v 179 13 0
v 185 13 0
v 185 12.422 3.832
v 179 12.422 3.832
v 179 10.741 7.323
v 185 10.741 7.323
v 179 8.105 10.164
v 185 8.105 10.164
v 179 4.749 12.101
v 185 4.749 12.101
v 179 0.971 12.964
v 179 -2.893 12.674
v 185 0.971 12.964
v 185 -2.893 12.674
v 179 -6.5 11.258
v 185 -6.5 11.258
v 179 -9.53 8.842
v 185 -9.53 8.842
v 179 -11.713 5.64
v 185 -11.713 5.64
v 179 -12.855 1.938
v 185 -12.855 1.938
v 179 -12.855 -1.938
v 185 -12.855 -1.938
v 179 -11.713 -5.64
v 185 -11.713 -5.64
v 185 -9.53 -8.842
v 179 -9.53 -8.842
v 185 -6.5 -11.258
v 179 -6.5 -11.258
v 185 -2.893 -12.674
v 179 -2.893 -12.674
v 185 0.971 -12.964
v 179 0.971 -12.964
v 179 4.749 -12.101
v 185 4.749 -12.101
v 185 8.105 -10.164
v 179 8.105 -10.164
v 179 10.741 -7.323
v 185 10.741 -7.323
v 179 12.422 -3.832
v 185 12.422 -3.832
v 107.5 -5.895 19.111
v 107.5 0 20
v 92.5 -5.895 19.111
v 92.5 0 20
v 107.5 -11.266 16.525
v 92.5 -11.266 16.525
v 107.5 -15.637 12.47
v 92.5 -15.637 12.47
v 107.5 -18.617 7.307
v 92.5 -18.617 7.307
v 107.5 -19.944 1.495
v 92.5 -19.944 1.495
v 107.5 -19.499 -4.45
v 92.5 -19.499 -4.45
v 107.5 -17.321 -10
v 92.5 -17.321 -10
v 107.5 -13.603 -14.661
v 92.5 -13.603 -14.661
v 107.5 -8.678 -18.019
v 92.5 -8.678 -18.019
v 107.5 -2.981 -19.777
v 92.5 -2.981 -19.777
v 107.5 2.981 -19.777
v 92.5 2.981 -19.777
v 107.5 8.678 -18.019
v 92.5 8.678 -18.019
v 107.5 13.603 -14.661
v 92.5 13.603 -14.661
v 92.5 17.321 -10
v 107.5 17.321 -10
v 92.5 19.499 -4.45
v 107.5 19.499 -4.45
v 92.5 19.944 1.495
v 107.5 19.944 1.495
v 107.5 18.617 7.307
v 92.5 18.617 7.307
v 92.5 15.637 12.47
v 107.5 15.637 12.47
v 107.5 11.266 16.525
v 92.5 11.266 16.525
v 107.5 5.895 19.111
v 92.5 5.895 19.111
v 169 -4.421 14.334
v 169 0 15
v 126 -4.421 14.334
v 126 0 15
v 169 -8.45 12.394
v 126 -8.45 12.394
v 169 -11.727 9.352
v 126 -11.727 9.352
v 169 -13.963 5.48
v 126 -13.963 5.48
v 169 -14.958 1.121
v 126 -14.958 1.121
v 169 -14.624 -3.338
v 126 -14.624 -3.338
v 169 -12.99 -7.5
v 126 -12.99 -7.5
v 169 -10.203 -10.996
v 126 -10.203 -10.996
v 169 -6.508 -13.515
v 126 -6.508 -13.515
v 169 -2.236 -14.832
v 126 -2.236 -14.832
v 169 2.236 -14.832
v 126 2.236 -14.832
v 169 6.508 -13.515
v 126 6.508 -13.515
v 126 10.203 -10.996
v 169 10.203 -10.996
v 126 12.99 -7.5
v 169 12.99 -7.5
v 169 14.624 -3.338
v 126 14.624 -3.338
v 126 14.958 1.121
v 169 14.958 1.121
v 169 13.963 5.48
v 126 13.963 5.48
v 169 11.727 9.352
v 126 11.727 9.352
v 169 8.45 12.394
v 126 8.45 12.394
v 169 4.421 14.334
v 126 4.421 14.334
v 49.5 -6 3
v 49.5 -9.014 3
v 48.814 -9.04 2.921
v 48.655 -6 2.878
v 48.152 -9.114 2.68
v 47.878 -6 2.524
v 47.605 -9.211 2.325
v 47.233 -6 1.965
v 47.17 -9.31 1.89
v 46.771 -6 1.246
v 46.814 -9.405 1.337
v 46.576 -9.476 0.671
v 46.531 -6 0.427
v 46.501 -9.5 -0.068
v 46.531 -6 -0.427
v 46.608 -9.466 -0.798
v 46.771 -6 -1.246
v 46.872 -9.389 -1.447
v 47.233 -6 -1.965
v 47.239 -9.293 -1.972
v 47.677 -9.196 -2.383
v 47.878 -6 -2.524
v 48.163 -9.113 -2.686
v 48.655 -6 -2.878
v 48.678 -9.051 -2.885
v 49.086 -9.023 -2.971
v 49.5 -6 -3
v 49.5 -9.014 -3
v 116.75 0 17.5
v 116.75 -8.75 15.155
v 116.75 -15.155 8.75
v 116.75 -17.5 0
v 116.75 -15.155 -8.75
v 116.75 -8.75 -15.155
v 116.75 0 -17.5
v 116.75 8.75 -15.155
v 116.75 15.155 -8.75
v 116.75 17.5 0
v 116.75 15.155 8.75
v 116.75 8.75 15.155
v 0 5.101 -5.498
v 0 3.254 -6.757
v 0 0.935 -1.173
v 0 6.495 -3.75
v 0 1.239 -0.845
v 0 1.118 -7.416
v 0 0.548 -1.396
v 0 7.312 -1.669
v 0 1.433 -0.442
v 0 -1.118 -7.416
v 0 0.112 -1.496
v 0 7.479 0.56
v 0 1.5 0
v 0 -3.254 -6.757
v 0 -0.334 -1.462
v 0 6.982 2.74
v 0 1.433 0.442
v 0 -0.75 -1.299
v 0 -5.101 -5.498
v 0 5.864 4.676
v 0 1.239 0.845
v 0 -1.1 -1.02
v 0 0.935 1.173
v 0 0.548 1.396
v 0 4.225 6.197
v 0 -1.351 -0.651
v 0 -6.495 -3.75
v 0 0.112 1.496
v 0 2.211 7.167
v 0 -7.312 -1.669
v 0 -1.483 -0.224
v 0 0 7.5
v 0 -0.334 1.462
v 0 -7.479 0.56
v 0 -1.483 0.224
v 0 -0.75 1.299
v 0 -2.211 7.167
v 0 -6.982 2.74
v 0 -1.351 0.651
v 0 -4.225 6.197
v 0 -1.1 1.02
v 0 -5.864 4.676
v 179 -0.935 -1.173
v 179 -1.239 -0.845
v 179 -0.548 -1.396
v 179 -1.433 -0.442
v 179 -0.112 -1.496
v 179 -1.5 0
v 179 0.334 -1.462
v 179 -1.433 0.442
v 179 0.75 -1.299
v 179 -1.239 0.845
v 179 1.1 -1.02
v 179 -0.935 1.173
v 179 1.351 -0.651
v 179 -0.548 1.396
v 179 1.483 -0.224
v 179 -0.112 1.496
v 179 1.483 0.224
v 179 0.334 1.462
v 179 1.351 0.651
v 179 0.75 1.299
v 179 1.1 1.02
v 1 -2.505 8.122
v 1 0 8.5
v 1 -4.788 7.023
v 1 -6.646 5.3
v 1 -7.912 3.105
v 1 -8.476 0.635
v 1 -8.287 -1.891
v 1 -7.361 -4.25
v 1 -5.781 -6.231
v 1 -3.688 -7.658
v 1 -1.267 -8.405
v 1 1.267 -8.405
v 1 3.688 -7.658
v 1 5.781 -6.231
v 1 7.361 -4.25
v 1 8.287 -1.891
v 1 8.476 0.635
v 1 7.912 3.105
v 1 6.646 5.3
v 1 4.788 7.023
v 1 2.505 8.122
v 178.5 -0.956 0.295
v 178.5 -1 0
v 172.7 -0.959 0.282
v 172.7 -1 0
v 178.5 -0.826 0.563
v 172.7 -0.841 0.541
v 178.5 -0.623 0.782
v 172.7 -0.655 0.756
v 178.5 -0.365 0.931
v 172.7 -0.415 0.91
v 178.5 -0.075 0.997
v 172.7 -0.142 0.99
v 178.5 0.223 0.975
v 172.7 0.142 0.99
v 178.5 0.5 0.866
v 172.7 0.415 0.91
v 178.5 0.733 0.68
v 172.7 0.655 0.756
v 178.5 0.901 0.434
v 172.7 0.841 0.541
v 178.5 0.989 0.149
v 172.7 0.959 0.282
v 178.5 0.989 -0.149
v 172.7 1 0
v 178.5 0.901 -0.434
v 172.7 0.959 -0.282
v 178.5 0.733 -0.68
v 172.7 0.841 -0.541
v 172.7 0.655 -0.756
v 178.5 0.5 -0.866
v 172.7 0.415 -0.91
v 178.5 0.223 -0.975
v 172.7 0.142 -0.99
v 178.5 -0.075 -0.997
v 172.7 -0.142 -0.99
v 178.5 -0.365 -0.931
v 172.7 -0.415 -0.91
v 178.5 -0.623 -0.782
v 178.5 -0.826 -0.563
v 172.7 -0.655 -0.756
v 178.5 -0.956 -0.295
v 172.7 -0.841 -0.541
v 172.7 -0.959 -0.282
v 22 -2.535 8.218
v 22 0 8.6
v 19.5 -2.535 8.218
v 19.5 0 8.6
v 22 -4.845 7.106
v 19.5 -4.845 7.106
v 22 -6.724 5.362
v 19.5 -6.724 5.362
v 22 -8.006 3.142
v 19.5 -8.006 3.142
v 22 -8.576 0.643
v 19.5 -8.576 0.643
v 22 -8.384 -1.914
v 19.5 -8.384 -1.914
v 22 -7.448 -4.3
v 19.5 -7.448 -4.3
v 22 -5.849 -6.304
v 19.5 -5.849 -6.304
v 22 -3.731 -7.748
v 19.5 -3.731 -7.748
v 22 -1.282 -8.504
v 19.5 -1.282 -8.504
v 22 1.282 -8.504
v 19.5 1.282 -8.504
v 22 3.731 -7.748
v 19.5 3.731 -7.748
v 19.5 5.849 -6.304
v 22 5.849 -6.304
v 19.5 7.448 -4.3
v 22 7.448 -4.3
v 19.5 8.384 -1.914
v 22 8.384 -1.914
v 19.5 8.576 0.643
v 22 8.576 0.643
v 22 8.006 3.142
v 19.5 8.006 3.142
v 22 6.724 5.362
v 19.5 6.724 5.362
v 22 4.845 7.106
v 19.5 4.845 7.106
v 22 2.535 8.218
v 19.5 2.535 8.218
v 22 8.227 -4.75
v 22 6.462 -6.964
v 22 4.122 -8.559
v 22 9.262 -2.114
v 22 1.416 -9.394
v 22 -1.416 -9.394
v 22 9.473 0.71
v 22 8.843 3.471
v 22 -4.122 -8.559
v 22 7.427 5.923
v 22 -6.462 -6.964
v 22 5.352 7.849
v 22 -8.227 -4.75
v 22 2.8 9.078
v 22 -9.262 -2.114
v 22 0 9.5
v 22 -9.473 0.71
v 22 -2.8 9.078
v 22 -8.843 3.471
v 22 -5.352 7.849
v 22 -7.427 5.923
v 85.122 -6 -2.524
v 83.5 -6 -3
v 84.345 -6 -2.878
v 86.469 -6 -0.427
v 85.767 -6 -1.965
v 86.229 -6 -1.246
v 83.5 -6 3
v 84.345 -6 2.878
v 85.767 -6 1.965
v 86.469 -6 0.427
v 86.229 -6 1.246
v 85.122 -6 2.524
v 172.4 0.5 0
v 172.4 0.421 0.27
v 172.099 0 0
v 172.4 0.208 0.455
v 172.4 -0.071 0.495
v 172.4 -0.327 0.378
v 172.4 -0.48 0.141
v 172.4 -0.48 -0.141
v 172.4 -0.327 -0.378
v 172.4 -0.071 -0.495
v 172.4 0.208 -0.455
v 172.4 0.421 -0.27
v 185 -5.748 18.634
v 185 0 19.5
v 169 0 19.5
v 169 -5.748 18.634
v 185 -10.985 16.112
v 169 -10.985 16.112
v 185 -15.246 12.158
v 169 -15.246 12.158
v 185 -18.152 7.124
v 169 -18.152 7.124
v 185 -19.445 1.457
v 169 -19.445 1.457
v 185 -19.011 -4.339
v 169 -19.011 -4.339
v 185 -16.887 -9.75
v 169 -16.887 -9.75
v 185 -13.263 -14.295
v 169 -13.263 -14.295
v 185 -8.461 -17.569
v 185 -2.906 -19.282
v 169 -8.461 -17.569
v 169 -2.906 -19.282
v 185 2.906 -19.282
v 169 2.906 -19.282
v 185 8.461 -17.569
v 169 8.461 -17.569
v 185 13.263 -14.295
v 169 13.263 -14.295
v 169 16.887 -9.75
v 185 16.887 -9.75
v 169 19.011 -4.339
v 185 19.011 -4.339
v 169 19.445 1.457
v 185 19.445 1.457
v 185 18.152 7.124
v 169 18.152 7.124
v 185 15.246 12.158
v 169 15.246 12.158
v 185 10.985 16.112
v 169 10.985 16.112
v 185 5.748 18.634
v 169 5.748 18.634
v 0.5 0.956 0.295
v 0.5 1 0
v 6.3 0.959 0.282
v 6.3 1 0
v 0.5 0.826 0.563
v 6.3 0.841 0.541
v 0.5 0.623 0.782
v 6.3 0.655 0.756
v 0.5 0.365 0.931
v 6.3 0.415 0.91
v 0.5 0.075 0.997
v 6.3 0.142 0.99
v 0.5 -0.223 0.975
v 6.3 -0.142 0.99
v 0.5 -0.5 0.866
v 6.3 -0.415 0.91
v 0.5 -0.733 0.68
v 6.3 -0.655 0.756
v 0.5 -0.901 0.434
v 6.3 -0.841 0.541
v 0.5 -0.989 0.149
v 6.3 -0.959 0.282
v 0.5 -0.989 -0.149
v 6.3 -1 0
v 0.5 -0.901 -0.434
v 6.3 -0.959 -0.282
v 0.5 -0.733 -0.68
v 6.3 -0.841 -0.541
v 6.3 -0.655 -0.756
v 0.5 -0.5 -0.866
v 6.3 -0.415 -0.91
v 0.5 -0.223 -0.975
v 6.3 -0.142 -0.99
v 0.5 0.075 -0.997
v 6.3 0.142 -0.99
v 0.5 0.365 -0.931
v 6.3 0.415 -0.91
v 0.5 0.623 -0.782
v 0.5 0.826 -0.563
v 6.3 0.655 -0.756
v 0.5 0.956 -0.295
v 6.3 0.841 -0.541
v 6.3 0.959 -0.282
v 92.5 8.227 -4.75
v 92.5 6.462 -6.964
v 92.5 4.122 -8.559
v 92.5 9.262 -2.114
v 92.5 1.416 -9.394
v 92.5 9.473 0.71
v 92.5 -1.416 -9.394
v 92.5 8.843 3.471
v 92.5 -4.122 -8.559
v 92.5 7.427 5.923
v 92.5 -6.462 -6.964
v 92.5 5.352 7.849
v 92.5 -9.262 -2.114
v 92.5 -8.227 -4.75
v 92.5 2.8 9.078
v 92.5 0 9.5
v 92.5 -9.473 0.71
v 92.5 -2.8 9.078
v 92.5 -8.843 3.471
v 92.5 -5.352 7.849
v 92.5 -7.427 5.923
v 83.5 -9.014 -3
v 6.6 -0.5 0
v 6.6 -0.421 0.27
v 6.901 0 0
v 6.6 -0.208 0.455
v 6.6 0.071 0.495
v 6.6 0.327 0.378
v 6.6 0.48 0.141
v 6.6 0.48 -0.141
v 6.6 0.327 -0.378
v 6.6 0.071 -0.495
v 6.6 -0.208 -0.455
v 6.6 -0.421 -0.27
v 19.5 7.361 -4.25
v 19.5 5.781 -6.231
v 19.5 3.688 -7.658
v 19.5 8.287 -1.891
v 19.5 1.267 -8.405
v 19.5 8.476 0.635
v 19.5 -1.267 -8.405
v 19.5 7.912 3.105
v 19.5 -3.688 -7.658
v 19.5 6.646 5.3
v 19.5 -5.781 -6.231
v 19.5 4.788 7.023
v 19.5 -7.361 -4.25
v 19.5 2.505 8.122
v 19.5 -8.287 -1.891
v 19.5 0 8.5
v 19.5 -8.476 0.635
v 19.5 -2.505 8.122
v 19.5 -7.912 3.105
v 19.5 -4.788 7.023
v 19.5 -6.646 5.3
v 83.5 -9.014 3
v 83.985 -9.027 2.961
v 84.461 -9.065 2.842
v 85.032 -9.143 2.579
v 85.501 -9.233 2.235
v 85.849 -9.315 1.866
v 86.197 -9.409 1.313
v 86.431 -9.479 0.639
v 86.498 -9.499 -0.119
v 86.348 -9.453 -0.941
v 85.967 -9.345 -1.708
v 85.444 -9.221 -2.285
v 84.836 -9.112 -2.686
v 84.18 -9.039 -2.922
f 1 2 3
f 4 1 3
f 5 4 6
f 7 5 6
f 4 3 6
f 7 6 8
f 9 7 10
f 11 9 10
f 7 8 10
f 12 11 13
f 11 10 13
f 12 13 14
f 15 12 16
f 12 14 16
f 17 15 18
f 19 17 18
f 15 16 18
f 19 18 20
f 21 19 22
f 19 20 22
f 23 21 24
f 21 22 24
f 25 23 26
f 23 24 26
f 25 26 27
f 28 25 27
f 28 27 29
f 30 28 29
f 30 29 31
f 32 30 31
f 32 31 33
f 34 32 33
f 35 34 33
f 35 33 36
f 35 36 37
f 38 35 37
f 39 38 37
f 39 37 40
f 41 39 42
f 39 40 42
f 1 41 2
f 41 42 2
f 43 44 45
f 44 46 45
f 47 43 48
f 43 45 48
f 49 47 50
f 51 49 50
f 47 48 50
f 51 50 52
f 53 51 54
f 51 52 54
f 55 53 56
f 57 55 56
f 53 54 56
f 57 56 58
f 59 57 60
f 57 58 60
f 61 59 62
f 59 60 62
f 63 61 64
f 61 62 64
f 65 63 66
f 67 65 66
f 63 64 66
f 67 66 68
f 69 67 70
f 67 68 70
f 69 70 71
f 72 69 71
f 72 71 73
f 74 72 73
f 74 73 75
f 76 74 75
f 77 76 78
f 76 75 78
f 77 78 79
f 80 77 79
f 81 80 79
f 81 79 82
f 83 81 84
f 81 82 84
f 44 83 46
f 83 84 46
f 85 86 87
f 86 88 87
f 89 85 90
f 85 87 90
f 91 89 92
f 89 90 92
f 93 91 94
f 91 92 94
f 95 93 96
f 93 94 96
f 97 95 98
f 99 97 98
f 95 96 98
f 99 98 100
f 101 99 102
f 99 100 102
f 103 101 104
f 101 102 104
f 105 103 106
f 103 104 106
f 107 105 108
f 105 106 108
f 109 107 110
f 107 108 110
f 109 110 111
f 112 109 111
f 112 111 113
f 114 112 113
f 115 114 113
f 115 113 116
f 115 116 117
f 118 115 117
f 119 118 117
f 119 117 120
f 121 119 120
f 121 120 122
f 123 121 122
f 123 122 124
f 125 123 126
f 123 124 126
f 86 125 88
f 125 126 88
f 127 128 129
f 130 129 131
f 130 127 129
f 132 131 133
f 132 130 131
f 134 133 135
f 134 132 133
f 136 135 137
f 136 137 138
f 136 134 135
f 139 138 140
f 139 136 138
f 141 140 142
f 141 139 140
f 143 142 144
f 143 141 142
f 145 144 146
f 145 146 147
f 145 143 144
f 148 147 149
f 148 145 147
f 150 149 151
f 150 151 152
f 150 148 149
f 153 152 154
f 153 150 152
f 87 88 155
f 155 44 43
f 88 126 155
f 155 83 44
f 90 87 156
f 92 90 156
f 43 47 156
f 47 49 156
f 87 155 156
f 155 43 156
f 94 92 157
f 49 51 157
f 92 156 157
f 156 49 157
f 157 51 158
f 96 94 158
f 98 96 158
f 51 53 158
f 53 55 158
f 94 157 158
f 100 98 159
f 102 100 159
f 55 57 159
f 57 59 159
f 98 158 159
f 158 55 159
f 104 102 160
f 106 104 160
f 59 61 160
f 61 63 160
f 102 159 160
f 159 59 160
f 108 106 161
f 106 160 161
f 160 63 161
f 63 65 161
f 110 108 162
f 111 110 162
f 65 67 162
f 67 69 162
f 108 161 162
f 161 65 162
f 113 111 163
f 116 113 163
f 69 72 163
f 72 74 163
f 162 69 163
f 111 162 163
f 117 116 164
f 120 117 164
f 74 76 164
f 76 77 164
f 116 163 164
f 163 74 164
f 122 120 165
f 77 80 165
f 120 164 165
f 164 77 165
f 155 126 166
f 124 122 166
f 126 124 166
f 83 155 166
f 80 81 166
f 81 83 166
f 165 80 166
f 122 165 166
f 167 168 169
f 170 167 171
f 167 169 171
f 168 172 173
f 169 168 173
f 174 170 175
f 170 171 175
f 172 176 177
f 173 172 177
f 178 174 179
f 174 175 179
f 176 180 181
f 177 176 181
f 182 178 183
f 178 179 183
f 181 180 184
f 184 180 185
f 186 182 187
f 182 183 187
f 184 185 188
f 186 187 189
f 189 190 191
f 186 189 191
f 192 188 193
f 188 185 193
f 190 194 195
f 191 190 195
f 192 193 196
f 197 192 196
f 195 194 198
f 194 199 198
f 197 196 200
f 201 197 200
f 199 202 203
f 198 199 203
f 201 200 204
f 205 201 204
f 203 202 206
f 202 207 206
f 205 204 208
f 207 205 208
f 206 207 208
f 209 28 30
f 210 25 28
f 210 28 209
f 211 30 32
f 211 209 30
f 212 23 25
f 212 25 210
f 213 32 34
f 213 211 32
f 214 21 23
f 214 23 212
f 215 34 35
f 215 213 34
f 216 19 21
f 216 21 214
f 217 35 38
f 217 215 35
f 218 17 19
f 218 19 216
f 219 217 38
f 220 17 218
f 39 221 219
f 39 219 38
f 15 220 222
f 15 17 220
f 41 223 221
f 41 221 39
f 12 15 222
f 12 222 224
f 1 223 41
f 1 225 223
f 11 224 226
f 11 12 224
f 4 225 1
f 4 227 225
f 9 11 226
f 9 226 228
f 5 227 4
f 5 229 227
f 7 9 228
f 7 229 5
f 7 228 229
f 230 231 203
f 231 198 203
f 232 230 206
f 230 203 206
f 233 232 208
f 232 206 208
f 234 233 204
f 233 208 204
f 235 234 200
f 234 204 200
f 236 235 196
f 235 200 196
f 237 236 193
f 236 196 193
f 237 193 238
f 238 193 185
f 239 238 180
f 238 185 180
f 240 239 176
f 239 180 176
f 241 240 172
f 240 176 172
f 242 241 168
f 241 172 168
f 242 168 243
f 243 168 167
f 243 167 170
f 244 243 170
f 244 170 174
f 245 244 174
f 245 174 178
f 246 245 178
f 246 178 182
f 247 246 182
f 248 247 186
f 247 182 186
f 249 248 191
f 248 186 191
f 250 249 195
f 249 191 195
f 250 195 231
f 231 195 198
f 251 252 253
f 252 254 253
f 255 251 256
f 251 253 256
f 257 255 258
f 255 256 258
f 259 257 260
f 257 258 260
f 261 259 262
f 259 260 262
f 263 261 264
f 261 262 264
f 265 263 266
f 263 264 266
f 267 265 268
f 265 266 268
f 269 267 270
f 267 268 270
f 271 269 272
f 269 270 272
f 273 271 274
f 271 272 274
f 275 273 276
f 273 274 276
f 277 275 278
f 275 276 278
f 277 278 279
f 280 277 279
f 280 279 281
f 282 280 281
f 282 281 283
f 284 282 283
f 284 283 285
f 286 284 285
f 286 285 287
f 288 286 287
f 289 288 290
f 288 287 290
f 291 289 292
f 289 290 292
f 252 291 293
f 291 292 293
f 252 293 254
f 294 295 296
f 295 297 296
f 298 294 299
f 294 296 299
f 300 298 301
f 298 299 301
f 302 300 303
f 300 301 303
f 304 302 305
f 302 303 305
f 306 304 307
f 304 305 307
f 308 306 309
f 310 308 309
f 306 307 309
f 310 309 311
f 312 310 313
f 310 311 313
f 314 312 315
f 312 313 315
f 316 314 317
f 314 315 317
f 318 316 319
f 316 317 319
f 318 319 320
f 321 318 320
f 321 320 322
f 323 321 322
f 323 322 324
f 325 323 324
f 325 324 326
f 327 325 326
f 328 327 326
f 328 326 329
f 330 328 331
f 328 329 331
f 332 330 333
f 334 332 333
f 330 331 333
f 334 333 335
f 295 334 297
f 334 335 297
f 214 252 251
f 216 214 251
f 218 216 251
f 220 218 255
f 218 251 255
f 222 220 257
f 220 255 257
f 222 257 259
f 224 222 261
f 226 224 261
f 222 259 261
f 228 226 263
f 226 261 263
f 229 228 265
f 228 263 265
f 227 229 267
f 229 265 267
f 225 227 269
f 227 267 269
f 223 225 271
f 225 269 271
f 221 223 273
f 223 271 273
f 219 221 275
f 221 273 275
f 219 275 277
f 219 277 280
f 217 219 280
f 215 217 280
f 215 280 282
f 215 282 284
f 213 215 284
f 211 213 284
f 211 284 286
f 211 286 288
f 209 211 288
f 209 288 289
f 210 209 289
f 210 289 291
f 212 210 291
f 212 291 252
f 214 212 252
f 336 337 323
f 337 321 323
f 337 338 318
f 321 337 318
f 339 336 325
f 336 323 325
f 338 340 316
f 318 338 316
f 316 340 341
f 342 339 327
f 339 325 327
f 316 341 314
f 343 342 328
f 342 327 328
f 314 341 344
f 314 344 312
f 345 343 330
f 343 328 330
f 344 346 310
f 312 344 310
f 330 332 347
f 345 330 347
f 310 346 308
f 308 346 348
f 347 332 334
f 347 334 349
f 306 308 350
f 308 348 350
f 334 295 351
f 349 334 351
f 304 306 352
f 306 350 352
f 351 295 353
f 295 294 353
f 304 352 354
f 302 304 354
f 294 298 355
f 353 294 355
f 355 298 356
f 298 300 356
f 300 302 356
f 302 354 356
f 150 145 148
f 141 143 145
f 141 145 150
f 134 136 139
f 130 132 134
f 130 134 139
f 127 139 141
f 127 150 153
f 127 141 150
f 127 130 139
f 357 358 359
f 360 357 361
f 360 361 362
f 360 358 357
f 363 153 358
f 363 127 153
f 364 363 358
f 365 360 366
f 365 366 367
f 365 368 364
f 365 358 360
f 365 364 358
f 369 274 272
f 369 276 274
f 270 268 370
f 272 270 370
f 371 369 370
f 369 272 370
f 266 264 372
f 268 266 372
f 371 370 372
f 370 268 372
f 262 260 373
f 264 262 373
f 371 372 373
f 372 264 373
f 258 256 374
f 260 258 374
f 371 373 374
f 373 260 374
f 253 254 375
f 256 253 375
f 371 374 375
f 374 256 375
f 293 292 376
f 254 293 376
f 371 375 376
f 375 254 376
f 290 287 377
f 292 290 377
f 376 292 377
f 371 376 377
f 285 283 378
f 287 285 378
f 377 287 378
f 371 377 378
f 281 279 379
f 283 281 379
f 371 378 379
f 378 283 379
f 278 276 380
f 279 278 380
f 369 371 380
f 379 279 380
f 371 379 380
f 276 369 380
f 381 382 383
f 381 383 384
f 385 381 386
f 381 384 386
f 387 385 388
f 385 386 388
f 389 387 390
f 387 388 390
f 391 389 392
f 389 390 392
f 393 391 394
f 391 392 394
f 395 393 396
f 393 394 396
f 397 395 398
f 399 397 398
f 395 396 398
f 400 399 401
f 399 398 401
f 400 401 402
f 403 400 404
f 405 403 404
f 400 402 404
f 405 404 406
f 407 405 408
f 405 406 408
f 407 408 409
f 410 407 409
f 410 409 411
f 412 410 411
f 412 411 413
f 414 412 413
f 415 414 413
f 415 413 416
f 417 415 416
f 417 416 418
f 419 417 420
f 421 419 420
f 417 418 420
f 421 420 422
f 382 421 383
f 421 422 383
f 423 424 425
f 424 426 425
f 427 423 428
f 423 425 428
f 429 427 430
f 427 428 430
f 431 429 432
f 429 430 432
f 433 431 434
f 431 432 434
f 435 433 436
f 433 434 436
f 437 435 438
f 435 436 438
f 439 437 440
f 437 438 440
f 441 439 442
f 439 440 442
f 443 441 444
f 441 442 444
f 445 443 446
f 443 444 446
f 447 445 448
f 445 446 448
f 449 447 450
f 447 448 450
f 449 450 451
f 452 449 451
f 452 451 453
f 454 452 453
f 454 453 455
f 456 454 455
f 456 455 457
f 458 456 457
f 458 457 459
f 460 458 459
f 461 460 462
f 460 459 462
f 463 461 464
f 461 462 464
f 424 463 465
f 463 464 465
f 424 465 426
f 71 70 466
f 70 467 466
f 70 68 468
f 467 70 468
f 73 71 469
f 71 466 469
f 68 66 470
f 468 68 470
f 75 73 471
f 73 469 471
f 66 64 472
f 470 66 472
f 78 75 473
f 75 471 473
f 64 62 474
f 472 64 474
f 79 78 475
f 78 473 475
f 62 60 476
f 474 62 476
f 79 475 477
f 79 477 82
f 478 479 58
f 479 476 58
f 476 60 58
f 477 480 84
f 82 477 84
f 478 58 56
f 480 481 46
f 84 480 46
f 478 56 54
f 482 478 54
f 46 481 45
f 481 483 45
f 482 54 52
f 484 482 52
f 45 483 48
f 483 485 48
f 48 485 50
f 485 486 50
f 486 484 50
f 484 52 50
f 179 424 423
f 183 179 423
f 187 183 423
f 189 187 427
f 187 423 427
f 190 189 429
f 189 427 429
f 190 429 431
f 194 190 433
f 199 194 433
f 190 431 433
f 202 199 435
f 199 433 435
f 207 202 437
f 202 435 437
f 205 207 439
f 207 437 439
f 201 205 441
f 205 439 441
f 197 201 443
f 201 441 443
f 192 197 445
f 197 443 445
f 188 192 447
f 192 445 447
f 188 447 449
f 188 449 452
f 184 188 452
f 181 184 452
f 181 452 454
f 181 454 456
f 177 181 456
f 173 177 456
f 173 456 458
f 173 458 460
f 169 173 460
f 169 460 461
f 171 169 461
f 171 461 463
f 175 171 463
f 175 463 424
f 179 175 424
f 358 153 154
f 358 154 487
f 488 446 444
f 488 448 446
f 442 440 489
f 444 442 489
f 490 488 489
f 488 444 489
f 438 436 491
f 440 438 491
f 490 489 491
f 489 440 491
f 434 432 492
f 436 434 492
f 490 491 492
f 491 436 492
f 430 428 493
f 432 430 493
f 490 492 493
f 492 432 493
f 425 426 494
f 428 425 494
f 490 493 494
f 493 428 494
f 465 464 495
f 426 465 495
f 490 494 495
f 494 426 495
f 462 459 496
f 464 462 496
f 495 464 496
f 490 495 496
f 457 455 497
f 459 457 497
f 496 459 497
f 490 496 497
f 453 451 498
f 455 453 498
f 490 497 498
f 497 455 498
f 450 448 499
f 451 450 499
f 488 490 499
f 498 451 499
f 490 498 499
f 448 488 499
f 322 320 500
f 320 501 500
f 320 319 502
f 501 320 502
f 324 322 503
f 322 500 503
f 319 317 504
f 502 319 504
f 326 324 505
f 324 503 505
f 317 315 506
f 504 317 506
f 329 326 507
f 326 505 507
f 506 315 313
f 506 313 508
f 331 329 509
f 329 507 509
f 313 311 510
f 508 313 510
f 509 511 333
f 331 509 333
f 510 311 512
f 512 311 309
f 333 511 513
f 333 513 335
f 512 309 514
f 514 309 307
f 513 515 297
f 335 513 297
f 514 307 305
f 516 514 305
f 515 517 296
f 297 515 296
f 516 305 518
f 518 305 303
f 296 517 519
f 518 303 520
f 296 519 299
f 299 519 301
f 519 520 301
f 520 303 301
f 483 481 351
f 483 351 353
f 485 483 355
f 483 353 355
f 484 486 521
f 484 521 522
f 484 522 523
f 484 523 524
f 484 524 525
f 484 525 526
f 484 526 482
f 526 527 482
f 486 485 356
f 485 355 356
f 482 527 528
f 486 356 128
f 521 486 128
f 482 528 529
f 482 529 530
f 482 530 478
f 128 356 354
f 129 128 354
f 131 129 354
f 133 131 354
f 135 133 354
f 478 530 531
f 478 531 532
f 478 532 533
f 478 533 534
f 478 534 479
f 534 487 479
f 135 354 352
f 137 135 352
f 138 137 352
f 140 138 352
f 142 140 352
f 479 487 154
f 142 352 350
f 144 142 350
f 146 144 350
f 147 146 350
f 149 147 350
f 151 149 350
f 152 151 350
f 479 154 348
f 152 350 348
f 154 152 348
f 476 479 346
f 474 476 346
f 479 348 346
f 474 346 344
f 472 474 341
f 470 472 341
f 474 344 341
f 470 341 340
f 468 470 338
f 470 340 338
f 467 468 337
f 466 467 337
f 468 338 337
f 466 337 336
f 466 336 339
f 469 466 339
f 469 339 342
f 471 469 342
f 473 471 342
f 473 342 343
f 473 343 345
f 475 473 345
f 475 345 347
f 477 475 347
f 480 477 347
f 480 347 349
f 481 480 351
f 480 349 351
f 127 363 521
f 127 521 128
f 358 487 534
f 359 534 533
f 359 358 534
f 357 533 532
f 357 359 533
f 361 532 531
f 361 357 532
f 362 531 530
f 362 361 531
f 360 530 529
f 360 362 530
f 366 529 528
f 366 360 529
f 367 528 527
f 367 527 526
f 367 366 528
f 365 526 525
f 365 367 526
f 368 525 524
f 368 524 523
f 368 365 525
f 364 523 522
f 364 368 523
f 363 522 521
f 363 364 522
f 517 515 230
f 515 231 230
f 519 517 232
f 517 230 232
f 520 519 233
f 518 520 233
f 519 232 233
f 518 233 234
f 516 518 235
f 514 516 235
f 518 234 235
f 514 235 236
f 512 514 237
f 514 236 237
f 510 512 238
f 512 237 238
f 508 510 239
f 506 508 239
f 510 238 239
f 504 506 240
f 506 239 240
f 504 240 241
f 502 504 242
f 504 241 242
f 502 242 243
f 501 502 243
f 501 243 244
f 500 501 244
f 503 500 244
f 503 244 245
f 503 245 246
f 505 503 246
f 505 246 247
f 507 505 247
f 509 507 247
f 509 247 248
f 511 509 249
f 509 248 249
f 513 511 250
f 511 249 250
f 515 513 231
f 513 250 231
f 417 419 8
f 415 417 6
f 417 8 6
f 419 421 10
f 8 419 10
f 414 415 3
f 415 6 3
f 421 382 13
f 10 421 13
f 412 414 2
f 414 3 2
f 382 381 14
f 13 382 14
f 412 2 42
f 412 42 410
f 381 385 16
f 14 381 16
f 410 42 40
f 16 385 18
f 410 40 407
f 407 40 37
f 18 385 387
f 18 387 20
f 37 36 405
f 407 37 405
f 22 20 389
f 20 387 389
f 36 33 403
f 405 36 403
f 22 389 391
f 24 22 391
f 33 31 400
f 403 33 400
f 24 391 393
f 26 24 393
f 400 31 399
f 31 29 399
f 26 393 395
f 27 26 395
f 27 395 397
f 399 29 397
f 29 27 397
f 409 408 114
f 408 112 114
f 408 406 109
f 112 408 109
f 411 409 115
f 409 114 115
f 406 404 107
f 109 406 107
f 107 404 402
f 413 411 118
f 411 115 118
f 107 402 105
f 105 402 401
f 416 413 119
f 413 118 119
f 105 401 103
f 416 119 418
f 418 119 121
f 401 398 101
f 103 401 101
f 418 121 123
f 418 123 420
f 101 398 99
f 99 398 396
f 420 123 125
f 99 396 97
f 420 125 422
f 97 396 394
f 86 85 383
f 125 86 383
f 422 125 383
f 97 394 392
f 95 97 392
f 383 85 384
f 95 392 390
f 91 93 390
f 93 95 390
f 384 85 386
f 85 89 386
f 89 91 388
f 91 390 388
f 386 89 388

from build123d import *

# Parameters (mm, degrees)
F3_START             = 6
F3_DEPTH             = 9.4
F4_R                 = 13
F5_DEPTH             = 6
F8_D                 = 2
F8_DEPTH             = 6.3
F8_CSINK_D           = 3
F8_CSINK_ANGLE       = 90
F8_TIP               = 0.600860619
F8_ON_F6_D           = 2
F8_ON_F6_DEPTH       = 6.3
F8_ON_F6_CSINK_D     = 3
F8_ON_F6_CSINK_ANGLE = 90
F8_ON_F6_TIP         = 0.600860619


with BuildPart() as f1:
    # F0 (on Front) → F1 (revolve)
    with BuildSketch(Plane.XZ):
        Polygon((1, 8.5), (0, 7.5), (0, 0), (169, 0), (169, 15), (126, 15), (107.5, 20), (92.5, 20), (92.5, 9.5), (22, 9.5), (22, 8.6), (19.5, 8.6), (19.5, 8.5), align=None)
        Polygon((169, 15), (169, 0), (185, 0), (185, 19.5), (169, 19.5), align=None)
    revolve(axis=Axis((105.2958741784, 0, 0), (1, 0, 0)))

    # F2 (on Front) → F3 (cut)
    with BuildSketch(Plane.XZ.offset(F3_START)):
        with BuildLine():
            ThreePointArc((83.5, -3), (86.5, 0), (83.5, 3))
            Line((83.5, 3), (49.5, 3))
            ThreePointArc((49.5, 3), (46.5, 0), (49.5, -3))
            Line((49.5, -3), (83.5, -3))
        make_face()
    extrude(amount=F3_DEPTH, mode=Mode.SUBTRACT)

    # F4 (on face) → F5 (cut)
    with BuildSketch(Plane.YZ.offset(185)):
        Circle(F4_R)
    extrude(amount=-F5_DEPTH, mode=Mode.SUBTRACT)

    # F8
    with Locations(Plane(origin=(0, 0, 0), x_dir=(0, -1, 0), z_dir=(-1, 0, 0))):
        with Locations((0, 0)):
            CounterSinkHole(F8_D / 2, F8_CSINK_D / 2, depth=F8_DEPTH, counter_sink_angle=F8_CSINK_ANGLE)
            with Locations((0, 0, -(F8_DEPTH + F8_TIP / 2))):  # 118° drill point
                Cone(0, F8_D / 2, F8_TIP, mode=Mode.SUBTRACT)

    # F8 on F6
    with Locations(Plane.YZ.offset(179)):
        with Locations((0, 0)):
            CounterSinkHole(F8_ON_F6_D / 2, F8_ON_F6_CSINK_D / 2, depth=F8_ON_F6_DEPTH, counter_sink_angle=F8_ON_F6_CSINK_ANGLE)
            with Locations((0, 0, -(F8_ON_F6_DEPTH + F8_ON_F6_TIP / 2))):  # 118° drill point
                Cone(0, F8_ON_F6_D / 2, F8_ON_F6_TIP, mode=Mode.SUBTRACT)


solid = f1.part
